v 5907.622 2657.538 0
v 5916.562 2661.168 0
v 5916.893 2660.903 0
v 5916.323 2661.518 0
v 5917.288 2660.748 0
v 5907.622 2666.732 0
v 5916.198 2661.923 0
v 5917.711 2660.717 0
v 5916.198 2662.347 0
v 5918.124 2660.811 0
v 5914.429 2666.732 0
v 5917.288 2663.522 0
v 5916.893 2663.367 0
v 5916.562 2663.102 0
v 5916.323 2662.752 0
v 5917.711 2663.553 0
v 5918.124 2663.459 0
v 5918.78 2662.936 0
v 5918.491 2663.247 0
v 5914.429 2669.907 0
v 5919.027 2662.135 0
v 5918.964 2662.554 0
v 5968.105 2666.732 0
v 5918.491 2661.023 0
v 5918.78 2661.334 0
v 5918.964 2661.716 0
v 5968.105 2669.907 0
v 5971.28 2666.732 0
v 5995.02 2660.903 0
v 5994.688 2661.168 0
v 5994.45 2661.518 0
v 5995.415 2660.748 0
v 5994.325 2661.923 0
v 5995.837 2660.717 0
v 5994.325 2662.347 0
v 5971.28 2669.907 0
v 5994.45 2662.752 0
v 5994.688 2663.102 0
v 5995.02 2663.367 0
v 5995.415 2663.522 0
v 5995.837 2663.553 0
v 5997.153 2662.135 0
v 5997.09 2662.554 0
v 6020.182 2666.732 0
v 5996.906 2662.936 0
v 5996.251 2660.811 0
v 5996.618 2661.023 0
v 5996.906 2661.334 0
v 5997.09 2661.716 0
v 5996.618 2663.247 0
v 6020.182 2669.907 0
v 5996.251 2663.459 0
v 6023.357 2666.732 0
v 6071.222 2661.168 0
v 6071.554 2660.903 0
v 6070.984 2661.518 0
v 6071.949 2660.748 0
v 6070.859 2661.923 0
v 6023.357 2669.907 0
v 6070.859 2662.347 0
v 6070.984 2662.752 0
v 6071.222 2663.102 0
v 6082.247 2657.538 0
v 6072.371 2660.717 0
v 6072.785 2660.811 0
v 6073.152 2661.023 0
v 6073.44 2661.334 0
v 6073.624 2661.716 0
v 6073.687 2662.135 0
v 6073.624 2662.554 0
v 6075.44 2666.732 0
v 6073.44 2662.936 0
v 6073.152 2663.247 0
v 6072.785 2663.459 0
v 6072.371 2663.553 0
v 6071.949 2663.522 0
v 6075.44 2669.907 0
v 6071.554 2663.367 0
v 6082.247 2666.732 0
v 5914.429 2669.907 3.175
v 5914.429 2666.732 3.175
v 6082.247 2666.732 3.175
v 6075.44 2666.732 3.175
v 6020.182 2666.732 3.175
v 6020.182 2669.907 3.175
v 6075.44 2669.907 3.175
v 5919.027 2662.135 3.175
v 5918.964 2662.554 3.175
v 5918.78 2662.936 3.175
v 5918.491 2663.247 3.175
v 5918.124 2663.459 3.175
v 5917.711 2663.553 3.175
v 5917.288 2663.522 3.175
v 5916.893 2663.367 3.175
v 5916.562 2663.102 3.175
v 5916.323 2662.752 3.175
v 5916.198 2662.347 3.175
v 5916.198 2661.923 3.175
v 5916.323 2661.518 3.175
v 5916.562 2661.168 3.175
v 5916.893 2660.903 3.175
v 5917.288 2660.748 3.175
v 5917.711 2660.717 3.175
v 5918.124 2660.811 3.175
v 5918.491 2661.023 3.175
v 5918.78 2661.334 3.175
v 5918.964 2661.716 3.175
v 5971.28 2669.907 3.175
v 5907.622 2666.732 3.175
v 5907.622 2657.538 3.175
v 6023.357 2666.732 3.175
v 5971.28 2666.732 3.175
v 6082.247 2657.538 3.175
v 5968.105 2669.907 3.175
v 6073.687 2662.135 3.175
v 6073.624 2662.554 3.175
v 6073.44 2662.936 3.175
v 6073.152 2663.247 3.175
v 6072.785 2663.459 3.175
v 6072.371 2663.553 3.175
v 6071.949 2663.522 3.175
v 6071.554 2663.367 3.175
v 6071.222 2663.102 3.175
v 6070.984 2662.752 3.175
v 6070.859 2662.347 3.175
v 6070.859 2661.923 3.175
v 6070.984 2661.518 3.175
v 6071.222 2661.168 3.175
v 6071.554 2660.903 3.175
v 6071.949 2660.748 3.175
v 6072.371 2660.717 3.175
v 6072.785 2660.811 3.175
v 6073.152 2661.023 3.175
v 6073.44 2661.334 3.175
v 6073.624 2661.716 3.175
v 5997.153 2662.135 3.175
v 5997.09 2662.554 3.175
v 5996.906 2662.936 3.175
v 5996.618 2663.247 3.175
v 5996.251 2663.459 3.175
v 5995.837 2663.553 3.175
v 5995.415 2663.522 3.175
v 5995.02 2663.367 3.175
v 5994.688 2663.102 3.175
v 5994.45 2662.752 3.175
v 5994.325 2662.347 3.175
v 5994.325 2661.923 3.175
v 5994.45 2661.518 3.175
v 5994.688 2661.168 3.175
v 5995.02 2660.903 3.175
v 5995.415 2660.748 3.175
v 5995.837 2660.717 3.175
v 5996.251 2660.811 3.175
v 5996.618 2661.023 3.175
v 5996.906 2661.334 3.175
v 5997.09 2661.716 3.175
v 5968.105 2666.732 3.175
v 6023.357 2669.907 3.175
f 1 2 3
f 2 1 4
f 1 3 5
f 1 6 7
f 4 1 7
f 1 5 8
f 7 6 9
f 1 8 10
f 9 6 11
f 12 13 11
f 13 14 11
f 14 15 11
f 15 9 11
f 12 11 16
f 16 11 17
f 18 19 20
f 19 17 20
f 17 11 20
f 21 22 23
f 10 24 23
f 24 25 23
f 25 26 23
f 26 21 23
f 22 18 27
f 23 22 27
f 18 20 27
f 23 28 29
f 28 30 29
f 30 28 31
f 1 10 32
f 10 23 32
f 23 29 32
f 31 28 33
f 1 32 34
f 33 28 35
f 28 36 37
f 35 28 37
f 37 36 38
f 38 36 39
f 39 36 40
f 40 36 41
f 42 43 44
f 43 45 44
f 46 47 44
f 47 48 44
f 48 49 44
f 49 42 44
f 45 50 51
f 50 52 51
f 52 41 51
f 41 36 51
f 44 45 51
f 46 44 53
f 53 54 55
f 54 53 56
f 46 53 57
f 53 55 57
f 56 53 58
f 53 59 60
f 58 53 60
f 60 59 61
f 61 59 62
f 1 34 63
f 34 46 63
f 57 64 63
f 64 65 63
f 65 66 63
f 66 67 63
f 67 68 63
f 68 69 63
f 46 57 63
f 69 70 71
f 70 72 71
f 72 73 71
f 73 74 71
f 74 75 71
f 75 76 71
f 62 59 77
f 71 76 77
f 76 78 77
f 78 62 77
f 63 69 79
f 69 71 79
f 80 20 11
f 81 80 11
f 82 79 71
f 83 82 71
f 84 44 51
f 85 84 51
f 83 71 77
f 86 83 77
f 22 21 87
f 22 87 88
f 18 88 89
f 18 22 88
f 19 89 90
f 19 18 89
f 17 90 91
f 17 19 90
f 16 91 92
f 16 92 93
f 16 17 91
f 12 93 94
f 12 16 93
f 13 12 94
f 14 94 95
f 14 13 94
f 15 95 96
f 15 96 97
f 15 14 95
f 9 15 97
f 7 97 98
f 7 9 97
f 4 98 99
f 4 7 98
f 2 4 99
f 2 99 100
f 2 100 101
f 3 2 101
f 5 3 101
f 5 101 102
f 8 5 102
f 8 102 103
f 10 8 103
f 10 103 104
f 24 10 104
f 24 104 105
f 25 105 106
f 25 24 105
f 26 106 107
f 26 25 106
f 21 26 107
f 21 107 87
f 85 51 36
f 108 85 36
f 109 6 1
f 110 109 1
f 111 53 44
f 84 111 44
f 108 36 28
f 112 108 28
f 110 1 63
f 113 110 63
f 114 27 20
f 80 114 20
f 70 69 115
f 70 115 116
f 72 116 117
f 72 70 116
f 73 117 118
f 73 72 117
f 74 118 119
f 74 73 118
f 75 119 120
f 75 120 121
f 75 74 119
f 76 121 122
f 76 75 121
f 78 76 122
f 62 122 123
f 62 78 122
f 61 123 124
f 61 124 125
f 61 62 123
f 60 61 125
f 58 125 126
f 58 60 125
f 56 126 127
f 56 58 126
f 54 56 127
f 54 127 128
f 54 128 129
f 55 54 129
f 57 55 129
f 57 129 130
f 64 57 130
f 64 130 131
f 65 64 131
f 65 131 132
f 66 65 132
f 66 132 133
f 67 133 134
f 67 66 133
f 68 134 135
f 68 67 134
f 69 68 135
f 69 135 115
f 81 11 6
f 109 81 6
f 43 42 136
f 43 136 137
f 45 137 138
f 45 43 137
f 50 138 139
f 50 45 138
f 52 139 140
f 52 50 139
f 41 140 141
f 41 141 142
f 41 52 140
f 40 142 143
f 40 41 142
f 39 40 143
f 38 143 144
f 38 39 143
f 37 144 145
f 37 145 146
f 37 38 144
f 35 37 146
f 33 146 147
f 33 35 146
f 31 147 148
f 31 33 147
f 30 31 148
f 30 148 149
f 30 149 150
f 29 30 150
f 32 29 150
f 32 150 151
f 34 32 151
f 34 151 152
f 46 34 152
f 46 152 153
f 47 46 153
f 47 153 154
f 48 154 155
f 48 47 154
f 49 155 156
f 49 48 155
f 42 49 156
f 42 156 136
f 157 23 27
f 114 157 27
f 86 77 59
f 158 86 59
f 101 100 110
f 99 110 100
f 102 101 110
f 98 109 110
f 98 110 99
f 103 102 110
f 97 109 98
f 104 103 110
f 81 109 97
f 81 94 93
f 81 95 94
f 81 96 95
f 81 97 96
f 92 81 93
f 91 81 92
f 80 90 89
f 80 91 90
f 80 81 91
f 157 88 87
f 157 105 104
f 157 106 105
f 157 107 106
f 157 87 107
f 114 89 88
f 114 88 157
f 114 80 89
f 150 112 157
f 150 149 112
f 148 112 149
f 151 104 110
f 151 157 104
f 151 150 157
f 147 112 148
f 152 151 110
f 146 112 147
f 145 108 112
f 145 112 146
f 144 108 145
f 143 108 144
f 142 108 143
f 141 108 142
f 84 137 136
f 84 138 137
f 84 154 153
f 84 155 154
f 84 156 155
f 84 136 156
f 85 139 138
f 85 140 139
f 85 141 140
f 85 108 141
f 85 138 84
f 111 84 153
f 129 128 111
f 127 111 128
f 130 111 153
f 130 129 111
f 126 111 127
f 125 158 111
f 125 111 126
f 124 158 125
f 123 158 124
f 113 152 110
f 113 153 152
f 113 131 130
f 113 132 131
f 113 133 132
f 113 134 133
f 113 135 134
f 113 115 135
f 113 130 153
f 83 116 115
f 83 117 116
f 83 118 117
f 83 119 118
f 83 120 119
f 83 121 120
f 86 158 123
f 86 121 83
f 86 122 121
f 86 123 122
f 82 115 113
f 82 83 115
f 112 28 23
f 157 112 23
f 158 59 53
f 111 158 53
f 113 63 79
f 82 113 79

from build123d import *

# Parameters (mm, degrees)
SKETCH1_R           = 1.4224
BOSS_EXTRUDE1_DEPTH = 3.175


with BuildPart() as part:
    # Sketch1 → Boss-Extrude1 (new body)
    with BuildSketch(Plane.XY):
        Polygon((6075.440076302, 2666.732382812), (6075.440076302, 2669.907382812), (6023.357376302, 2669.907382812), (6023.357376302, 2666.732382812), (6020.182376302, 2666.732382812), (6020.182376302, 2669.907382812), (5971.279772433, 2669.907382812), (5971.279772433, 2666.732382812), (5968.104772433, 2666.732382812), (5968.104772433, 2669.907382812), (5914.429476302, 2669.907382812), (5914.429476302, 2666.732382812), (5907.622276302, 2666.732382812), (5907.622276302, 2657.537582812), (6082.247276302, 2657.537582812), (6082.247276302, 2666.732382812), align=None)
        with Locations((5995.731074367, 2662.134982812)):
            Circle(SKETCH1_R, mode=Mode.SUBTRACT)
        with Locations((5917.604476302, 2662.134982812)):
            Circle(SKETCH1_R, mode=Mode.SUBTRACT)
        with Locations((6072.265076302, 2662.134982812)):
            Circle(SKETCH1_R, mode=Mode.SUBTRACT)
    extrude(amount=BOSS_EXTRUDE1_DEPTH)


solid = part.part
